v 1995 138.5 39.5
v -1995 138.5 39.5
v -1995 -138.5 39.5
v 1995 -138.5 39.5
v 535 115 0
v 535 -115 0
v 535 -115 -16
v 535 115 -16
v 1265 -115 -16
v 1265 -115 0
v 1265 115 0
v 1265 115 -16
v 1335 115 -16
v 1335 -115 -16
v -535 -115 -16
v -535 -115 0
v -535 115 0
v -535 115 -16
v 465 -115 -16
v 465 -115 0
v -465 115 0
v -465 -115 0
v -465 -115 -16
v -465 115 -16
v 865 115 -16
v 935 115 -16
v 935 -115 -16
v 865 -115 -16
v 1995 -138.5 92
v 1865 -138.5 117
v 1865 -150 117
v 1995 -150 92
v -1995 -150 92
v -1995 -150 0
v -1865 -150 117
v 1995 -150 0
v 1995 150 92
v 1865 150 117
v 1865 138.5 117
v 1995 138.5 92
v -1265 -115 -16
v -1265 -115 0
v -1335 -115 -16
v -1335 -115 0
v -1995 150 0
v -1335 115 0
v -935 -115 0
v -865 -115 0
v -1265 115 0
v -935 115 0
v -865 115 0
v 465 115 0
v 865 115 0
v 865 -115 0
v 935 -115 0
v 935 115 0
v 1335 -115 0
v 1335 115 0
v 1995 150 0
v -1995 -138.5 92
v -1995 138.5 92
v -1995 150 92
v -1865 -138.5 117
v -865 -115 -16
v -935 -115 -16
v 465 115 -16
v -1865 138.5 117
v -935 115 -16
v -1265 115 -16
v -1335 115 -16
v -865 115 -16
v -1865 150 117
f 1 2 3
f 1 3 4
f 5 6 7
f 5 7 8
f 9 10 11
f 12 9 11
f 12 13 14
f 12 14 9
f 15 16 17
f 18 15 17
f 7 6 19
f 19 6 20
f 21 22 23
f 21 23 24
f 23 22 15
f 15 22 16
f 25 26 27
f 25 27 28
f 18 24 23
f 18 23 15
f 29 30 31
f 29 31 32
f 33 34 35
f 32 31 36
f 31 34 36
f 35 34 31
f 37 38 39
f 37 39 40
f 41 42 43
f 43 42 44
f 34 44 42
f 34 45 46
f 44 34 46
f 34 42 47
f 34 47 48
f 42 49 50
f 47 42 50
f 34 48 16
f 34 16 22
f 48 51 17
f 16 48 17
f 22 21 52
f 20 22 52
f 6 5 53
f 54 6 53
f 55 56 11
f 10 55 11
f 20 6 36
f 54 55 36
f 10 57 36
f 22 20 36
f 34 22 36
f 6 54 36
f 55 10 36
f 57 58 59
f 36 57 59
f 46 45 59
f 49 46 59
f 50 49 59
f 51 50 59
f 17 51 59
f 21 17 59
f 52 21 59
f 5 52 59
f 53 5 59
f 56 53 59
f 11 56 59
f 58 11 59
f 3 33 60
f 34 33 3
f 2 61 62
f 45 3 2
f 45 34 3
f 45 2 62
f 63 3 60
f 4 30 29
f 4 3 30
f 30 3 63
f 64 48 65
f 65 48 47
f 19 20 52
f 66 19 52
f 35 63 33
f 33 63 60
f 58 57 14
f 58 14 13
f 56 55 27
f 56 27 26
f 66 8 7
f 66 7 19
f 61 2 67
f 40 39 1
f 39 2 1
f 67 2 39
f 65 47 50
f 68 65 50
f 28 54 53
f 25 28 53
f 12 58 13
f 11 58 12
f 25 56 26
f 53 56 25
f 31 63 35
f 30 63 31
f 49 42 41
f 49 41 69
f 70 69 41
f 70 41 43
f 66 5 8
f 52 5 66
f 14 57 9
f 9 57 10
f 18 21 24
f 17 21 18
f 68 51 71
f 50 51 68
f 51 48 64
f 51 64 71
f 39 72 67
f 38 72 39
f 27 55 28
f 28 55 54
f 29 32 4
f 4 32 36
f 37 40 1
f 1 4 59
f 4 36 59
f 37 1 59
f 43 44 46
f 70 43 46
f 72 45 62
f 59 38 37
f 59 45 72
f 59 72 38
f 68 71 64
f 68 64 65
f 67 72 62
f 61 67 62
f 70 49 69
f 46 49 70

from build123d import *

# Parameters (mm, degrees)
SKETCH_1_W          = 3990
SKETCH_1_H          = 300
SKETCH_1_R          = 13
SKETCH_1_R_2        = 11.5
EXTRUDE_1608_DEPTH  = 39.5
SKETCH_2_W          = 3990
SKETCH_2_H          = 11.5
EXTRUDE_1_DEPTH     = 77.5
SKETCH_3_W          = 70
SKETCH_3_H          = 230
EXTRUDE_2_DEPTH     = 16
SKETCH_4_R          = 13
CUT_EXTRUDE_1_DEPTH = 2003.131676489
CUT_EXTRUDE_2_DEPTH = 2021.820130541
SKETCH_6_W          = 3990
SKETCH_6_H          = 277
EXTRUDE_3_DEPTH     = 39.5
SKETCH_7_W          = 70
SKETCH_7_H          = 230
EXTRUDE_4_DEPTH     = 16


with BuildPart() as part:
    # 草图1 → Extrude 1608 (new body)
    with BuildSketch(Plane.XY):
        Rectangle(SKETCH_1_W, SKETCH_1_H)
        with Locations((1940, 80)):
            Circle(SKETCH_1_R, mode=Mode.SUBTRACT)
        with Locations((1860, 80)):
            Circle(SKETCH_1_R, mode=Mode.SUBTRACT)
        with Locations((1780, 80)):
            Circle(SKETCH_1_R, mode=Mode.SUBTRACT)
        with Locations((1700, 80)):
            Circle(SKETCH_1_R, mode=Mode.SUBTRACT)
        with Locations((1540, 80)):
            Circle(SKETCH_1_R_2, mode=Mode.SUBTRACT)
        with Locations((1380, 80)):
            Circle(SKETCH_1_R_2, mode=Mode.SUBTRACT)
        with Locations((1220, 80)):
            Circle(SKETCH_1_R_2, mode=Mode.SUBTRACT)
        with Locations((1060, 80)):
            Circle(SKETCH_1_R_2, mode=Mode.SUBTRACT)
        with Locations((980, 80)):
            Circle(SKETCH_1_R_2, mode=Mode.SUBTRACT)
        with Locations((820, 80)):
            Circle(SKETCH_1_R_2, mode=Mode.SUBTRACT)
        with Locations((740, 80)):
            Circle(SKETCH_1_R_2, mode=Mode.SUBTRACT)
        with Locations((580, 80)):
            Circle(SKETCH_1_R_2, mode=Mode.SUBTRACT)
        with Locations((980, 0)):
            Circle(SKETCH_1_R_2, mode=Mode.SUBTRACT)
        with Locations((1060, 0)):
            Circle(SKETCH_1_R_2, mode=Mode.SUBTRACT)
        with Locations((820, 0)):
            Circle(SKETCH_1_R_2, mode=Mode.SUBTRACT)
        with Locations((740, 0)):
            Circle(SKETCH_1_R_2, mode=Mode.SUBTRACT)
        with Locations((580, 0)):
            Circle(SKETCH_1_R_2, mode=Mode.SUBTRACT)
        with Locations((1220, 0)):
            Circle(SKETCH_1_R_2, mode=Mode.SUBTRACT)
        with Locations((1380, 0)):
            Circle(SKETCH_1_R_2, mode=Mode.SUBTRACT)
        with Locations((1540, 0)):
            Circle(SKETCH_1_R_2, mode=Mode.SUBTRACT)
        with Locations((1700, 0)):
            Circle(SKETCH_1_R, mode=Mode.SUBTRACT)
        with Locations((1780, 0)):
            Circle(SKETCH_1_R, mode=Mode.SUBTRACT)
        with Locations((1860, 0)):
            Circle(SKETCH_1_R, mode=Mode.SUBTRACT)
        with Locations((1940, 0)):
            Circle(SKETCH_1_R, mode=Mode.SUBTRACT)
        with Locations((420, 80)):
            Circle(SKETCH_1_R_2, mode=Mode.SUBTRACT)
        with Locations((420, 0)):
            Circle(SKETCH_1_R_2, mode=Mode.SUBTRACT)
        with Locations((300, 0)):
            Circle(SKETCH_1_R_2, mode=Mode.SUBTRACT)
        with Locations((300, 80)):
            Circle(SKETCH_1_R_2, mode=Mode.SUBTRACT)
        with Locations((220, 80)):
            Circle(SKETCH_1_R_2, mode=Mode.SUBTRACT)
        with Locations((220, 0)):
            Circle(SKETCH_1_R_2, mode=Mode.SUBTRACT)
        with Locations((140, 0)):
            Circle(SKETCH_1_R, mode=Mode.SUBTRACT)
        with Locations((140, 80)):
            Circle(SKETCH_1_R, mode=Mode.SUBTRACT)
        with Locations((60, 80)):
            Circle(SKETCH_1_R, mode=Mode.SUBTRACT)
        with Locations((60, 0)):
            Circle(SKETCH_1_R, mode=Mode.SUBTRACT)
        with Locations(Location((1700, -80, 0), (0, 0, 180))):
            Circle(SKETCH_1_R, mode=Mode.SUBTRACT)
        with Locations(Location((1780, -80, 0), (0, 0, 180))):
            Circle(SKETCH_1_R, mode=Mode.SUBTRACT)
        with Locations(Location((1860, -80, 0), (0, 0, 180))):
            Circle(SKETCH_1_R, mode=Mode.SUBTRACT)
        with Locations(Location((1940, -80, 0), (0, 0, 180))):
            Circle(SKETCH_1_R, mode=Mode.SUBTRACT)
        with Locations(Location((580, -80, 0), (0, 0, 180))):
            Circle(SKETCH_1_R_2, mode=Mode.SUBTRACT)
        with Locations(Location((740, -80, 0), (0, 0, 180))):
            Circle(SKETCH_1_R_2, mode=Mode.SUBTRACT)
        with Locations(Location((820, -80, 0), (0, 0, 180))):
            Circle(SKETCH_1_R_2, mode=Mode.SUBTRACT)
        with Locations(Location((980, -80, 0), (0, 0, 180))):
            Circle(SKETCH_1_R_2, mode=Mode.SUBTRACT)
        with Locations(Location((1060, -80, 0), (0, 0, 180))):
            Circle(SKETCH_1_R_2, mode=Mode.SUBTRACT)
        with Locations(Location((1220, -80, 0), (0, 0, 180))):
            Circle(SKETCH_1_R_2, mode=Mode.SUBTRACT)
        with Locations(Location((1380, -80, 0), (0, 0, 180))):
            Circle(SKETCH_1_R_2, mode=Mode.SUBTRACT)
        with Locations(Location((1540, -80, 0), (0, 0, 180))):
            Circle(SKETCH_1_R_2, mode=Mode.SUBTRACT)
        with Locations(Location((220, -80, 0), (0, 0, 180))):
            Circle(SKETCH_1_R_2, mode=Mode.SUBTRACT)
        with Locations(Location((300, -80, 0), (0, 0, 180))):
            Circle(SKETCH_1_R_2, mode=Mode.SUBTRACT)
        with Locations(Location((420, -80, 0), (0, 0, 180))):
            Circle(SKETCH_1_R_2, mode=Mode.SUBTRACT)
        with Locations(Location((60, -80, 0), (0, 0, 180))):
            Circle(SKETCH_1_R, mode=Mode.SUBTRACT)
        with Locations(Location((140, -80, 0), (0, 0, 180))):
            Circle(SKETCH_1_R, mode=Mode.SUBTRACT)
        with Locations((-140, -80)):
            Circle(SKETCH_1_R, mode=Mode.SUBTRACT)
        with Locations((-60, -80)):
            Circle(SKETCH_1_R, mode=Mode.SUBTRACT)
        with Locations((-580, -80)):
            Circle(SKETCH_1_R_2, mode=Mode.SUBTRACT)
        with Locations((-420, -80)):
            Circle(SKETCH_1_R_2, mode=Mode.SUBTRACT)
        with Locations((-300, -80)):
            Circle(SKETCH_1_R_2, mode=Mode.SUBTRACT)
        with Locations((-220, -80)):
            Circle(SKETCH_1_R_2, mode=Mode.SUBTRACT)
        with Locations((-1540, -80)):
            Circle(SKETCH_1_R_2, mode=Mode.SUBTRACT)
        with Locations((-1380, -80)):
            Circle(SKETCH_1_R_2, mode=Mode.SUBTRACT)
        with Locations((-1220, -80)):
            Circle(SKETCH_1_R_2, mode=Mode.SUBTRACT)
        with Locations((-1060, -80)):
            Circle(SKETCH_1_R_2, mode=Mode.SUBTRACT)
        with Locations((-980, -80)):
            Circle(SKETCH_1_R_2, mode=Mode.SUBTRACT)
        with Locations((-820, -80)):
            Circle(SKETCH_1_R_2, mode=Mode.SUBTRACT)
        with Locations((-740, -80)):
            Circle(SKETCH_1_R_2, mode=Mode.SUBTRACT)
        with Locations((-1940, -80)):
            Circle(SKETCH_1_R, mode=Mode.SUBTRACT)
        with Locations((-1860, -80)):
            Circle(SKETCH_1_R, mode=Mode.SUBTRACT)
        with Locations((-1780, -80)):
            Circle(SKETCH_1_R, mode=Mode.SUBTRACT)
        with Locations((-1700, -80)):
            Circle(SKETCH_1_R, mode=Mode.SUBTRACT)
        with Locations(Location((-60, 0, 0), (0, 0, 180))):
            Circle(SKETCH_1_R, mode=Mode.SUBTRACT)
        with Locations(Location((-60, 80, 0), (0, 0, 180))):
            Circle(SKETCH_1_R, mode=Mode.SUBTRACT)
        with Locations(Location((-140, 80, 0), (0, 0, 180))):
            Circle(SKETCH_1_R, mode=Mode.SUBTRACT)
        with Locations(Location((-140, 0, 0), (0, 0, 180))):
            Circle(SKETCH_1_R, mode=Mode.SUBTRACT)
        with Locations(Location((-220, 0, 0), (0, 0, 180))):
            Circle(SKETCH_1_R_2, mode=Mode.SUBTRACT)
        with Locations(Location((-220, 80, 0), (0, 0, 180))):
            Circle(SKETCH_1_R_2, mode=Mode.SUBTRACT)
        with Locations(Location((-300, 80, 0), (0, 0, 180))):
            Circle(SKETCH_1_R_2, mode=Mode.SUBTRACT)
        with Locations(Location((-300, 0, 0), (0, 0, 180))):
            Circle(SKETCH_1_R_2, mode=Mode.SUBTRACT)
        with Locations(Location((-420, 0, 0), (0, 0, 180))):
            Circle(SKETCH_1_R_2, mode=Mode.SUBTRACT)
        with Locations(Location((-420, 80, 0), (0, 0, 180))):
            Circle(SKETCH_1_R_2, mode=Mode.SUBTRACT)
        with Locations(Location((-1940, 0, 0), (0, 0, 180))):
            Circle(SKETCH_1_R, mode=Mode.SUBTRACT)
        with Locations(Location((-1860, 0, 0), (0, 0, 180))):
            Circle(SKETCH_1_R, mode=Mode.SUBTRACT)
        with Locations(Location((-1780, 0, 0), (0, 0, 180))):
            Circle(SKETCH_1_R, mode=Mode.SUBTRACT)
        with Locations(Location((-1700, 0, 0), (0, 0, 180))):
            Circle(SKETCH_1_R, mode=Mode.SUBTRACT)
        with Locations(Location((-1540, 0, 0), (0, 0, 180))):
            Circle(SKETCH_1_R_2, mode=Mode.SUBTRACT)
        with Locations(Location((-1380, 0, 0), (0, 0, 180))):
            Circle(SKETCH_1_R_2, mode=Mode.SUBTRACT)
        with Locations(Location((-1220, 0, 0), (0, 0, 180))):
            Circle(SKETCH_1_R_2, mode=Mode.SUBTRACT)
        with Locations(Location((-580, 0, 0), (0, 0, 180))):
            Circle(SKETCH_1_R_2, mode=Mode.SUBTRACT)
        with Locations(Location((-740, 0, 0), (0, 0, 180))):
            Circle(SKETCH_1_R_2, mode=Mode.SUBTRACT)
        with Locations(Location((-820, 0, 0), (0, 0, 180))):
            Circle(SKETCH_1_R_2, mode=Mode.SUBTRACT)
        with Locations(Location((-1060, 0, 0), (0, 0, 180))):
            Circle(SKETCH_1_R_2, mode=Mode.SUBTRACT)
        with Locations(Location((-980, 0, 0), (0, 0, 180))):
            Circle(SKETCH_1_R_2, mode=Mode.SUBTRACT)
        with Locations(Location((-580, 80, 0), (0, 0, 180))):
            Circle(SKETCH_1_R_2, mode=Mode.SUBTRACT)
        with Locations(Location((-740, 80, 0), (0, 0, 180))):
            Circle(SKETCH_1_R_2, mode=Mode.SUBTRACT)
        with Locations(Location((-820, 80, 0), (0, 0, 180))):
            Circle(SKETCH_1_R_2, mode=Mode.SUBTRACT)
        with Locations(Location((-980, 80, 0), (0, 0, 180))):
            Circle(SKETCH_1_R_2, mode=Mode.SUBTRACT)
        with Locations(Location((-1060, 80, 0), (0, 0, 180))):
            Circle(SKETCH_1_R_2, mode=Mode.SUBTRACT)
        with Locations(Location((-1220, 80, 0), (0, 0, 180))):
            Circle(SKETCH_1_R_2, mode=Mode.SUBTRACT)
        with Locations(Location((-1380, 80, 0), (0, 0, 180))):
            Circle(SKETCH_1_R_2, mode=Mode.SUBTRACT)
        with Locations(Location((-1540, 80, 0), (0, 0, 180))):
            Circle(SKETCH_1_R_2, mode=Mode.SUBTRACT)
        with Locations(Location((-1700, 80, 0), (0, 0, 180))):
            Circle(SKETCH_1_R, mode=Mode.SUBTRACT)
        with Locations(Location((-1780, 80, 0), (0, 0, 180))):
            Circle(SKETCH_1_R, mode=Mode.SUBTRACT)
        with Locations(Location((-1860, 80, 0), (0, 0, 180))):
            Circle(SKETCH_1_R, mode=Mode.SUBTRACT)
        with Locations(Location((-1940, 80, 0), (0, 0, 180))):
            Circle(SKETCH_1_R, mode=Mode.SUBTRACT)
    extrude(amount=EXTRUDE_1608_DEPTH)

    # 草图2 → 凸台-拉伸1 (add)
    with BuildSketch(Plane.XY.offset(39.5)):
        with Locations((0, 144.25)):
            Rectangle(SKETCH_2_W, SKETCH_2_H)
        with Locations((0, -144.25)):
            Rectangle(SKETCH_2_W, SKETCH_2_H)
    extrude(amount=EXTRUDE_1_DEPTH)

    # 草图3 → 凸台-拉伸2 (add)
    with BuildSketch(Plane(origin=(0, 0, 0), x_dir=(-1, 0, 0), z_dir=(0, 0, -1))):
        with Locations((1300, 0)):
            Rectangle(SKETCH_3_W, SKETCH_3_H)
        with Locations((900, 0)):
            Rectangle(SKETCH_3_W, SKETCH_3_H)
        with Locations((-1300, 0)):
            Rectangle(SKETCH_3_W, SKETCH_3_H)
        with Locations((500, 0)):
            Rectangle(SKETCH_3_W, SKETCH_3_H)
        with Locations((-900, 0)):
            Rectangle(SKETCH_3_W, SKETCH_3_H)
        with Locations((-500, 0)):
            Rectangle(SKETCH_3_W, SKETCH_3_H)
    extrude(amount=EXTRUDE_2_DEPTH)

    # 草图4 → 切除-拉伸1 (cut, through all)
    with BuildSketch(Plane.XY.offset(39.5)):
        with Locations((1300, 80)):
            Circle(SKETCH_4_R)
        with Locations((900, 80)):
            Circle(SKETCH_4_R)
        with Locations((900, 0)):
            Circle(SKETCH_4_R)
        with Locations((1300, 0)):
            Circle(SKETCH_4_R)
        with Locations(Location((900, -80, 0), (0, 0, 180))):
            Circle(SKETCH_4_R)
        with Locations(Location((1300, -80, 0), (0, 0, 180))):
            Circle(SKETCH_4_R)
        with Locations((500, 80)):
            Circle(SKETCH_4_R)
        with Locations((500, 0)):
            Circle(SKETCH_4_R)
        with Locations(Location((500, -80, 0), (0, 0, 180))):
            Circle(SKETCH_4_R)
        with Locations((-500, -80)):
            Circle(SKETCH_4_R)
        with Locations(Location((-500, 0, 0), (0, 0, 180))):
            Circle(SKETCH_4_R)
        with Locations(Location((-500, 80, 0), (0, 0, 180))):
            Circle(SKETCH_4_R)
        with Locations((-1300, -80)):
            Circle(SKETCH_4_R)
        with Locations((-900, -80)):
            Circle(SKETCH_4_R)
        with Locations(Location((-1300, 0, 0), (0, 0, 180))):
            Circle(SKETCH_4_R)
        with Locations(Location((-900, 0, 0), (0, 0, 180))):
            Circle(SKETCH_4_R)
        with Locations(Location((-900, 80, 0), (0, 0, 180))):
            Circle(SKETCH_4_R)
        with Locations(Location((-1300, 80, 0), (0, 0, 180))):
            Circle(SKETCH_4_R)
    extrude(amount=-CUT_EXTRUDE_1_DEPTH, mode=Mode.SUBTRACT)

    # 草图5 → 切除-拉伸2 (cut, through all)
    with BuildSketch(Plane(origin=(0, 150, 0), x_dir=(-1, 0, 0), z_dir=(0, 1, 0))):
        Polygon((-1995, 92), (-1995, 117), (-1865, 117), align=None)
        Polygon((1865, 117), (1995, 92), (1995, 117), align=None)
    extrude(amount=-CUT_EXTRUDE_2_DEPTH, mode=Mode.SUBTRACT)

    # 草图6 → 凸台-拉伸3 (add)
    with BuildSketch(Plane.XY.offset(39.5)):
        Rectangle(SKETCH_6_W, SKETCH_6_H)
    extrude(amount=-EXTRUDE_3_DEPTH)

    # 草图7 → 凸台-拉伸4 (add)
    with BuildSketch(Plane(origin=(0, 0, 0), x_dir=(-1, 0, 0), z_dir=(0, 0, -1))):
        with Locations((-1300, 0)):
            Rectangle(SKETCH_7_W, SKETCH_7_H)
        with Locations((-900, 0)):
            Rectangle(SKETCH_7_W, SKETCH_7_H)
        with Locations((-500, 0)):
            Rectangle(SKETCH_7_W, SKETCH_7_H)
        with Locations((500, 0)):
            Rectangle(SKETCH_7_W, SKETCH_7_H)
        with Locations((900, 0)):
            Rectangle(SKETCH_7_W, SKETCH_7_H)
        with Locations((1300, 0)):
            Rectangle(SKETCH_7_W, SKETCH_7_H)
    extrude(amount=EXTRUDE_4_DEPTH)


solid = part.part
